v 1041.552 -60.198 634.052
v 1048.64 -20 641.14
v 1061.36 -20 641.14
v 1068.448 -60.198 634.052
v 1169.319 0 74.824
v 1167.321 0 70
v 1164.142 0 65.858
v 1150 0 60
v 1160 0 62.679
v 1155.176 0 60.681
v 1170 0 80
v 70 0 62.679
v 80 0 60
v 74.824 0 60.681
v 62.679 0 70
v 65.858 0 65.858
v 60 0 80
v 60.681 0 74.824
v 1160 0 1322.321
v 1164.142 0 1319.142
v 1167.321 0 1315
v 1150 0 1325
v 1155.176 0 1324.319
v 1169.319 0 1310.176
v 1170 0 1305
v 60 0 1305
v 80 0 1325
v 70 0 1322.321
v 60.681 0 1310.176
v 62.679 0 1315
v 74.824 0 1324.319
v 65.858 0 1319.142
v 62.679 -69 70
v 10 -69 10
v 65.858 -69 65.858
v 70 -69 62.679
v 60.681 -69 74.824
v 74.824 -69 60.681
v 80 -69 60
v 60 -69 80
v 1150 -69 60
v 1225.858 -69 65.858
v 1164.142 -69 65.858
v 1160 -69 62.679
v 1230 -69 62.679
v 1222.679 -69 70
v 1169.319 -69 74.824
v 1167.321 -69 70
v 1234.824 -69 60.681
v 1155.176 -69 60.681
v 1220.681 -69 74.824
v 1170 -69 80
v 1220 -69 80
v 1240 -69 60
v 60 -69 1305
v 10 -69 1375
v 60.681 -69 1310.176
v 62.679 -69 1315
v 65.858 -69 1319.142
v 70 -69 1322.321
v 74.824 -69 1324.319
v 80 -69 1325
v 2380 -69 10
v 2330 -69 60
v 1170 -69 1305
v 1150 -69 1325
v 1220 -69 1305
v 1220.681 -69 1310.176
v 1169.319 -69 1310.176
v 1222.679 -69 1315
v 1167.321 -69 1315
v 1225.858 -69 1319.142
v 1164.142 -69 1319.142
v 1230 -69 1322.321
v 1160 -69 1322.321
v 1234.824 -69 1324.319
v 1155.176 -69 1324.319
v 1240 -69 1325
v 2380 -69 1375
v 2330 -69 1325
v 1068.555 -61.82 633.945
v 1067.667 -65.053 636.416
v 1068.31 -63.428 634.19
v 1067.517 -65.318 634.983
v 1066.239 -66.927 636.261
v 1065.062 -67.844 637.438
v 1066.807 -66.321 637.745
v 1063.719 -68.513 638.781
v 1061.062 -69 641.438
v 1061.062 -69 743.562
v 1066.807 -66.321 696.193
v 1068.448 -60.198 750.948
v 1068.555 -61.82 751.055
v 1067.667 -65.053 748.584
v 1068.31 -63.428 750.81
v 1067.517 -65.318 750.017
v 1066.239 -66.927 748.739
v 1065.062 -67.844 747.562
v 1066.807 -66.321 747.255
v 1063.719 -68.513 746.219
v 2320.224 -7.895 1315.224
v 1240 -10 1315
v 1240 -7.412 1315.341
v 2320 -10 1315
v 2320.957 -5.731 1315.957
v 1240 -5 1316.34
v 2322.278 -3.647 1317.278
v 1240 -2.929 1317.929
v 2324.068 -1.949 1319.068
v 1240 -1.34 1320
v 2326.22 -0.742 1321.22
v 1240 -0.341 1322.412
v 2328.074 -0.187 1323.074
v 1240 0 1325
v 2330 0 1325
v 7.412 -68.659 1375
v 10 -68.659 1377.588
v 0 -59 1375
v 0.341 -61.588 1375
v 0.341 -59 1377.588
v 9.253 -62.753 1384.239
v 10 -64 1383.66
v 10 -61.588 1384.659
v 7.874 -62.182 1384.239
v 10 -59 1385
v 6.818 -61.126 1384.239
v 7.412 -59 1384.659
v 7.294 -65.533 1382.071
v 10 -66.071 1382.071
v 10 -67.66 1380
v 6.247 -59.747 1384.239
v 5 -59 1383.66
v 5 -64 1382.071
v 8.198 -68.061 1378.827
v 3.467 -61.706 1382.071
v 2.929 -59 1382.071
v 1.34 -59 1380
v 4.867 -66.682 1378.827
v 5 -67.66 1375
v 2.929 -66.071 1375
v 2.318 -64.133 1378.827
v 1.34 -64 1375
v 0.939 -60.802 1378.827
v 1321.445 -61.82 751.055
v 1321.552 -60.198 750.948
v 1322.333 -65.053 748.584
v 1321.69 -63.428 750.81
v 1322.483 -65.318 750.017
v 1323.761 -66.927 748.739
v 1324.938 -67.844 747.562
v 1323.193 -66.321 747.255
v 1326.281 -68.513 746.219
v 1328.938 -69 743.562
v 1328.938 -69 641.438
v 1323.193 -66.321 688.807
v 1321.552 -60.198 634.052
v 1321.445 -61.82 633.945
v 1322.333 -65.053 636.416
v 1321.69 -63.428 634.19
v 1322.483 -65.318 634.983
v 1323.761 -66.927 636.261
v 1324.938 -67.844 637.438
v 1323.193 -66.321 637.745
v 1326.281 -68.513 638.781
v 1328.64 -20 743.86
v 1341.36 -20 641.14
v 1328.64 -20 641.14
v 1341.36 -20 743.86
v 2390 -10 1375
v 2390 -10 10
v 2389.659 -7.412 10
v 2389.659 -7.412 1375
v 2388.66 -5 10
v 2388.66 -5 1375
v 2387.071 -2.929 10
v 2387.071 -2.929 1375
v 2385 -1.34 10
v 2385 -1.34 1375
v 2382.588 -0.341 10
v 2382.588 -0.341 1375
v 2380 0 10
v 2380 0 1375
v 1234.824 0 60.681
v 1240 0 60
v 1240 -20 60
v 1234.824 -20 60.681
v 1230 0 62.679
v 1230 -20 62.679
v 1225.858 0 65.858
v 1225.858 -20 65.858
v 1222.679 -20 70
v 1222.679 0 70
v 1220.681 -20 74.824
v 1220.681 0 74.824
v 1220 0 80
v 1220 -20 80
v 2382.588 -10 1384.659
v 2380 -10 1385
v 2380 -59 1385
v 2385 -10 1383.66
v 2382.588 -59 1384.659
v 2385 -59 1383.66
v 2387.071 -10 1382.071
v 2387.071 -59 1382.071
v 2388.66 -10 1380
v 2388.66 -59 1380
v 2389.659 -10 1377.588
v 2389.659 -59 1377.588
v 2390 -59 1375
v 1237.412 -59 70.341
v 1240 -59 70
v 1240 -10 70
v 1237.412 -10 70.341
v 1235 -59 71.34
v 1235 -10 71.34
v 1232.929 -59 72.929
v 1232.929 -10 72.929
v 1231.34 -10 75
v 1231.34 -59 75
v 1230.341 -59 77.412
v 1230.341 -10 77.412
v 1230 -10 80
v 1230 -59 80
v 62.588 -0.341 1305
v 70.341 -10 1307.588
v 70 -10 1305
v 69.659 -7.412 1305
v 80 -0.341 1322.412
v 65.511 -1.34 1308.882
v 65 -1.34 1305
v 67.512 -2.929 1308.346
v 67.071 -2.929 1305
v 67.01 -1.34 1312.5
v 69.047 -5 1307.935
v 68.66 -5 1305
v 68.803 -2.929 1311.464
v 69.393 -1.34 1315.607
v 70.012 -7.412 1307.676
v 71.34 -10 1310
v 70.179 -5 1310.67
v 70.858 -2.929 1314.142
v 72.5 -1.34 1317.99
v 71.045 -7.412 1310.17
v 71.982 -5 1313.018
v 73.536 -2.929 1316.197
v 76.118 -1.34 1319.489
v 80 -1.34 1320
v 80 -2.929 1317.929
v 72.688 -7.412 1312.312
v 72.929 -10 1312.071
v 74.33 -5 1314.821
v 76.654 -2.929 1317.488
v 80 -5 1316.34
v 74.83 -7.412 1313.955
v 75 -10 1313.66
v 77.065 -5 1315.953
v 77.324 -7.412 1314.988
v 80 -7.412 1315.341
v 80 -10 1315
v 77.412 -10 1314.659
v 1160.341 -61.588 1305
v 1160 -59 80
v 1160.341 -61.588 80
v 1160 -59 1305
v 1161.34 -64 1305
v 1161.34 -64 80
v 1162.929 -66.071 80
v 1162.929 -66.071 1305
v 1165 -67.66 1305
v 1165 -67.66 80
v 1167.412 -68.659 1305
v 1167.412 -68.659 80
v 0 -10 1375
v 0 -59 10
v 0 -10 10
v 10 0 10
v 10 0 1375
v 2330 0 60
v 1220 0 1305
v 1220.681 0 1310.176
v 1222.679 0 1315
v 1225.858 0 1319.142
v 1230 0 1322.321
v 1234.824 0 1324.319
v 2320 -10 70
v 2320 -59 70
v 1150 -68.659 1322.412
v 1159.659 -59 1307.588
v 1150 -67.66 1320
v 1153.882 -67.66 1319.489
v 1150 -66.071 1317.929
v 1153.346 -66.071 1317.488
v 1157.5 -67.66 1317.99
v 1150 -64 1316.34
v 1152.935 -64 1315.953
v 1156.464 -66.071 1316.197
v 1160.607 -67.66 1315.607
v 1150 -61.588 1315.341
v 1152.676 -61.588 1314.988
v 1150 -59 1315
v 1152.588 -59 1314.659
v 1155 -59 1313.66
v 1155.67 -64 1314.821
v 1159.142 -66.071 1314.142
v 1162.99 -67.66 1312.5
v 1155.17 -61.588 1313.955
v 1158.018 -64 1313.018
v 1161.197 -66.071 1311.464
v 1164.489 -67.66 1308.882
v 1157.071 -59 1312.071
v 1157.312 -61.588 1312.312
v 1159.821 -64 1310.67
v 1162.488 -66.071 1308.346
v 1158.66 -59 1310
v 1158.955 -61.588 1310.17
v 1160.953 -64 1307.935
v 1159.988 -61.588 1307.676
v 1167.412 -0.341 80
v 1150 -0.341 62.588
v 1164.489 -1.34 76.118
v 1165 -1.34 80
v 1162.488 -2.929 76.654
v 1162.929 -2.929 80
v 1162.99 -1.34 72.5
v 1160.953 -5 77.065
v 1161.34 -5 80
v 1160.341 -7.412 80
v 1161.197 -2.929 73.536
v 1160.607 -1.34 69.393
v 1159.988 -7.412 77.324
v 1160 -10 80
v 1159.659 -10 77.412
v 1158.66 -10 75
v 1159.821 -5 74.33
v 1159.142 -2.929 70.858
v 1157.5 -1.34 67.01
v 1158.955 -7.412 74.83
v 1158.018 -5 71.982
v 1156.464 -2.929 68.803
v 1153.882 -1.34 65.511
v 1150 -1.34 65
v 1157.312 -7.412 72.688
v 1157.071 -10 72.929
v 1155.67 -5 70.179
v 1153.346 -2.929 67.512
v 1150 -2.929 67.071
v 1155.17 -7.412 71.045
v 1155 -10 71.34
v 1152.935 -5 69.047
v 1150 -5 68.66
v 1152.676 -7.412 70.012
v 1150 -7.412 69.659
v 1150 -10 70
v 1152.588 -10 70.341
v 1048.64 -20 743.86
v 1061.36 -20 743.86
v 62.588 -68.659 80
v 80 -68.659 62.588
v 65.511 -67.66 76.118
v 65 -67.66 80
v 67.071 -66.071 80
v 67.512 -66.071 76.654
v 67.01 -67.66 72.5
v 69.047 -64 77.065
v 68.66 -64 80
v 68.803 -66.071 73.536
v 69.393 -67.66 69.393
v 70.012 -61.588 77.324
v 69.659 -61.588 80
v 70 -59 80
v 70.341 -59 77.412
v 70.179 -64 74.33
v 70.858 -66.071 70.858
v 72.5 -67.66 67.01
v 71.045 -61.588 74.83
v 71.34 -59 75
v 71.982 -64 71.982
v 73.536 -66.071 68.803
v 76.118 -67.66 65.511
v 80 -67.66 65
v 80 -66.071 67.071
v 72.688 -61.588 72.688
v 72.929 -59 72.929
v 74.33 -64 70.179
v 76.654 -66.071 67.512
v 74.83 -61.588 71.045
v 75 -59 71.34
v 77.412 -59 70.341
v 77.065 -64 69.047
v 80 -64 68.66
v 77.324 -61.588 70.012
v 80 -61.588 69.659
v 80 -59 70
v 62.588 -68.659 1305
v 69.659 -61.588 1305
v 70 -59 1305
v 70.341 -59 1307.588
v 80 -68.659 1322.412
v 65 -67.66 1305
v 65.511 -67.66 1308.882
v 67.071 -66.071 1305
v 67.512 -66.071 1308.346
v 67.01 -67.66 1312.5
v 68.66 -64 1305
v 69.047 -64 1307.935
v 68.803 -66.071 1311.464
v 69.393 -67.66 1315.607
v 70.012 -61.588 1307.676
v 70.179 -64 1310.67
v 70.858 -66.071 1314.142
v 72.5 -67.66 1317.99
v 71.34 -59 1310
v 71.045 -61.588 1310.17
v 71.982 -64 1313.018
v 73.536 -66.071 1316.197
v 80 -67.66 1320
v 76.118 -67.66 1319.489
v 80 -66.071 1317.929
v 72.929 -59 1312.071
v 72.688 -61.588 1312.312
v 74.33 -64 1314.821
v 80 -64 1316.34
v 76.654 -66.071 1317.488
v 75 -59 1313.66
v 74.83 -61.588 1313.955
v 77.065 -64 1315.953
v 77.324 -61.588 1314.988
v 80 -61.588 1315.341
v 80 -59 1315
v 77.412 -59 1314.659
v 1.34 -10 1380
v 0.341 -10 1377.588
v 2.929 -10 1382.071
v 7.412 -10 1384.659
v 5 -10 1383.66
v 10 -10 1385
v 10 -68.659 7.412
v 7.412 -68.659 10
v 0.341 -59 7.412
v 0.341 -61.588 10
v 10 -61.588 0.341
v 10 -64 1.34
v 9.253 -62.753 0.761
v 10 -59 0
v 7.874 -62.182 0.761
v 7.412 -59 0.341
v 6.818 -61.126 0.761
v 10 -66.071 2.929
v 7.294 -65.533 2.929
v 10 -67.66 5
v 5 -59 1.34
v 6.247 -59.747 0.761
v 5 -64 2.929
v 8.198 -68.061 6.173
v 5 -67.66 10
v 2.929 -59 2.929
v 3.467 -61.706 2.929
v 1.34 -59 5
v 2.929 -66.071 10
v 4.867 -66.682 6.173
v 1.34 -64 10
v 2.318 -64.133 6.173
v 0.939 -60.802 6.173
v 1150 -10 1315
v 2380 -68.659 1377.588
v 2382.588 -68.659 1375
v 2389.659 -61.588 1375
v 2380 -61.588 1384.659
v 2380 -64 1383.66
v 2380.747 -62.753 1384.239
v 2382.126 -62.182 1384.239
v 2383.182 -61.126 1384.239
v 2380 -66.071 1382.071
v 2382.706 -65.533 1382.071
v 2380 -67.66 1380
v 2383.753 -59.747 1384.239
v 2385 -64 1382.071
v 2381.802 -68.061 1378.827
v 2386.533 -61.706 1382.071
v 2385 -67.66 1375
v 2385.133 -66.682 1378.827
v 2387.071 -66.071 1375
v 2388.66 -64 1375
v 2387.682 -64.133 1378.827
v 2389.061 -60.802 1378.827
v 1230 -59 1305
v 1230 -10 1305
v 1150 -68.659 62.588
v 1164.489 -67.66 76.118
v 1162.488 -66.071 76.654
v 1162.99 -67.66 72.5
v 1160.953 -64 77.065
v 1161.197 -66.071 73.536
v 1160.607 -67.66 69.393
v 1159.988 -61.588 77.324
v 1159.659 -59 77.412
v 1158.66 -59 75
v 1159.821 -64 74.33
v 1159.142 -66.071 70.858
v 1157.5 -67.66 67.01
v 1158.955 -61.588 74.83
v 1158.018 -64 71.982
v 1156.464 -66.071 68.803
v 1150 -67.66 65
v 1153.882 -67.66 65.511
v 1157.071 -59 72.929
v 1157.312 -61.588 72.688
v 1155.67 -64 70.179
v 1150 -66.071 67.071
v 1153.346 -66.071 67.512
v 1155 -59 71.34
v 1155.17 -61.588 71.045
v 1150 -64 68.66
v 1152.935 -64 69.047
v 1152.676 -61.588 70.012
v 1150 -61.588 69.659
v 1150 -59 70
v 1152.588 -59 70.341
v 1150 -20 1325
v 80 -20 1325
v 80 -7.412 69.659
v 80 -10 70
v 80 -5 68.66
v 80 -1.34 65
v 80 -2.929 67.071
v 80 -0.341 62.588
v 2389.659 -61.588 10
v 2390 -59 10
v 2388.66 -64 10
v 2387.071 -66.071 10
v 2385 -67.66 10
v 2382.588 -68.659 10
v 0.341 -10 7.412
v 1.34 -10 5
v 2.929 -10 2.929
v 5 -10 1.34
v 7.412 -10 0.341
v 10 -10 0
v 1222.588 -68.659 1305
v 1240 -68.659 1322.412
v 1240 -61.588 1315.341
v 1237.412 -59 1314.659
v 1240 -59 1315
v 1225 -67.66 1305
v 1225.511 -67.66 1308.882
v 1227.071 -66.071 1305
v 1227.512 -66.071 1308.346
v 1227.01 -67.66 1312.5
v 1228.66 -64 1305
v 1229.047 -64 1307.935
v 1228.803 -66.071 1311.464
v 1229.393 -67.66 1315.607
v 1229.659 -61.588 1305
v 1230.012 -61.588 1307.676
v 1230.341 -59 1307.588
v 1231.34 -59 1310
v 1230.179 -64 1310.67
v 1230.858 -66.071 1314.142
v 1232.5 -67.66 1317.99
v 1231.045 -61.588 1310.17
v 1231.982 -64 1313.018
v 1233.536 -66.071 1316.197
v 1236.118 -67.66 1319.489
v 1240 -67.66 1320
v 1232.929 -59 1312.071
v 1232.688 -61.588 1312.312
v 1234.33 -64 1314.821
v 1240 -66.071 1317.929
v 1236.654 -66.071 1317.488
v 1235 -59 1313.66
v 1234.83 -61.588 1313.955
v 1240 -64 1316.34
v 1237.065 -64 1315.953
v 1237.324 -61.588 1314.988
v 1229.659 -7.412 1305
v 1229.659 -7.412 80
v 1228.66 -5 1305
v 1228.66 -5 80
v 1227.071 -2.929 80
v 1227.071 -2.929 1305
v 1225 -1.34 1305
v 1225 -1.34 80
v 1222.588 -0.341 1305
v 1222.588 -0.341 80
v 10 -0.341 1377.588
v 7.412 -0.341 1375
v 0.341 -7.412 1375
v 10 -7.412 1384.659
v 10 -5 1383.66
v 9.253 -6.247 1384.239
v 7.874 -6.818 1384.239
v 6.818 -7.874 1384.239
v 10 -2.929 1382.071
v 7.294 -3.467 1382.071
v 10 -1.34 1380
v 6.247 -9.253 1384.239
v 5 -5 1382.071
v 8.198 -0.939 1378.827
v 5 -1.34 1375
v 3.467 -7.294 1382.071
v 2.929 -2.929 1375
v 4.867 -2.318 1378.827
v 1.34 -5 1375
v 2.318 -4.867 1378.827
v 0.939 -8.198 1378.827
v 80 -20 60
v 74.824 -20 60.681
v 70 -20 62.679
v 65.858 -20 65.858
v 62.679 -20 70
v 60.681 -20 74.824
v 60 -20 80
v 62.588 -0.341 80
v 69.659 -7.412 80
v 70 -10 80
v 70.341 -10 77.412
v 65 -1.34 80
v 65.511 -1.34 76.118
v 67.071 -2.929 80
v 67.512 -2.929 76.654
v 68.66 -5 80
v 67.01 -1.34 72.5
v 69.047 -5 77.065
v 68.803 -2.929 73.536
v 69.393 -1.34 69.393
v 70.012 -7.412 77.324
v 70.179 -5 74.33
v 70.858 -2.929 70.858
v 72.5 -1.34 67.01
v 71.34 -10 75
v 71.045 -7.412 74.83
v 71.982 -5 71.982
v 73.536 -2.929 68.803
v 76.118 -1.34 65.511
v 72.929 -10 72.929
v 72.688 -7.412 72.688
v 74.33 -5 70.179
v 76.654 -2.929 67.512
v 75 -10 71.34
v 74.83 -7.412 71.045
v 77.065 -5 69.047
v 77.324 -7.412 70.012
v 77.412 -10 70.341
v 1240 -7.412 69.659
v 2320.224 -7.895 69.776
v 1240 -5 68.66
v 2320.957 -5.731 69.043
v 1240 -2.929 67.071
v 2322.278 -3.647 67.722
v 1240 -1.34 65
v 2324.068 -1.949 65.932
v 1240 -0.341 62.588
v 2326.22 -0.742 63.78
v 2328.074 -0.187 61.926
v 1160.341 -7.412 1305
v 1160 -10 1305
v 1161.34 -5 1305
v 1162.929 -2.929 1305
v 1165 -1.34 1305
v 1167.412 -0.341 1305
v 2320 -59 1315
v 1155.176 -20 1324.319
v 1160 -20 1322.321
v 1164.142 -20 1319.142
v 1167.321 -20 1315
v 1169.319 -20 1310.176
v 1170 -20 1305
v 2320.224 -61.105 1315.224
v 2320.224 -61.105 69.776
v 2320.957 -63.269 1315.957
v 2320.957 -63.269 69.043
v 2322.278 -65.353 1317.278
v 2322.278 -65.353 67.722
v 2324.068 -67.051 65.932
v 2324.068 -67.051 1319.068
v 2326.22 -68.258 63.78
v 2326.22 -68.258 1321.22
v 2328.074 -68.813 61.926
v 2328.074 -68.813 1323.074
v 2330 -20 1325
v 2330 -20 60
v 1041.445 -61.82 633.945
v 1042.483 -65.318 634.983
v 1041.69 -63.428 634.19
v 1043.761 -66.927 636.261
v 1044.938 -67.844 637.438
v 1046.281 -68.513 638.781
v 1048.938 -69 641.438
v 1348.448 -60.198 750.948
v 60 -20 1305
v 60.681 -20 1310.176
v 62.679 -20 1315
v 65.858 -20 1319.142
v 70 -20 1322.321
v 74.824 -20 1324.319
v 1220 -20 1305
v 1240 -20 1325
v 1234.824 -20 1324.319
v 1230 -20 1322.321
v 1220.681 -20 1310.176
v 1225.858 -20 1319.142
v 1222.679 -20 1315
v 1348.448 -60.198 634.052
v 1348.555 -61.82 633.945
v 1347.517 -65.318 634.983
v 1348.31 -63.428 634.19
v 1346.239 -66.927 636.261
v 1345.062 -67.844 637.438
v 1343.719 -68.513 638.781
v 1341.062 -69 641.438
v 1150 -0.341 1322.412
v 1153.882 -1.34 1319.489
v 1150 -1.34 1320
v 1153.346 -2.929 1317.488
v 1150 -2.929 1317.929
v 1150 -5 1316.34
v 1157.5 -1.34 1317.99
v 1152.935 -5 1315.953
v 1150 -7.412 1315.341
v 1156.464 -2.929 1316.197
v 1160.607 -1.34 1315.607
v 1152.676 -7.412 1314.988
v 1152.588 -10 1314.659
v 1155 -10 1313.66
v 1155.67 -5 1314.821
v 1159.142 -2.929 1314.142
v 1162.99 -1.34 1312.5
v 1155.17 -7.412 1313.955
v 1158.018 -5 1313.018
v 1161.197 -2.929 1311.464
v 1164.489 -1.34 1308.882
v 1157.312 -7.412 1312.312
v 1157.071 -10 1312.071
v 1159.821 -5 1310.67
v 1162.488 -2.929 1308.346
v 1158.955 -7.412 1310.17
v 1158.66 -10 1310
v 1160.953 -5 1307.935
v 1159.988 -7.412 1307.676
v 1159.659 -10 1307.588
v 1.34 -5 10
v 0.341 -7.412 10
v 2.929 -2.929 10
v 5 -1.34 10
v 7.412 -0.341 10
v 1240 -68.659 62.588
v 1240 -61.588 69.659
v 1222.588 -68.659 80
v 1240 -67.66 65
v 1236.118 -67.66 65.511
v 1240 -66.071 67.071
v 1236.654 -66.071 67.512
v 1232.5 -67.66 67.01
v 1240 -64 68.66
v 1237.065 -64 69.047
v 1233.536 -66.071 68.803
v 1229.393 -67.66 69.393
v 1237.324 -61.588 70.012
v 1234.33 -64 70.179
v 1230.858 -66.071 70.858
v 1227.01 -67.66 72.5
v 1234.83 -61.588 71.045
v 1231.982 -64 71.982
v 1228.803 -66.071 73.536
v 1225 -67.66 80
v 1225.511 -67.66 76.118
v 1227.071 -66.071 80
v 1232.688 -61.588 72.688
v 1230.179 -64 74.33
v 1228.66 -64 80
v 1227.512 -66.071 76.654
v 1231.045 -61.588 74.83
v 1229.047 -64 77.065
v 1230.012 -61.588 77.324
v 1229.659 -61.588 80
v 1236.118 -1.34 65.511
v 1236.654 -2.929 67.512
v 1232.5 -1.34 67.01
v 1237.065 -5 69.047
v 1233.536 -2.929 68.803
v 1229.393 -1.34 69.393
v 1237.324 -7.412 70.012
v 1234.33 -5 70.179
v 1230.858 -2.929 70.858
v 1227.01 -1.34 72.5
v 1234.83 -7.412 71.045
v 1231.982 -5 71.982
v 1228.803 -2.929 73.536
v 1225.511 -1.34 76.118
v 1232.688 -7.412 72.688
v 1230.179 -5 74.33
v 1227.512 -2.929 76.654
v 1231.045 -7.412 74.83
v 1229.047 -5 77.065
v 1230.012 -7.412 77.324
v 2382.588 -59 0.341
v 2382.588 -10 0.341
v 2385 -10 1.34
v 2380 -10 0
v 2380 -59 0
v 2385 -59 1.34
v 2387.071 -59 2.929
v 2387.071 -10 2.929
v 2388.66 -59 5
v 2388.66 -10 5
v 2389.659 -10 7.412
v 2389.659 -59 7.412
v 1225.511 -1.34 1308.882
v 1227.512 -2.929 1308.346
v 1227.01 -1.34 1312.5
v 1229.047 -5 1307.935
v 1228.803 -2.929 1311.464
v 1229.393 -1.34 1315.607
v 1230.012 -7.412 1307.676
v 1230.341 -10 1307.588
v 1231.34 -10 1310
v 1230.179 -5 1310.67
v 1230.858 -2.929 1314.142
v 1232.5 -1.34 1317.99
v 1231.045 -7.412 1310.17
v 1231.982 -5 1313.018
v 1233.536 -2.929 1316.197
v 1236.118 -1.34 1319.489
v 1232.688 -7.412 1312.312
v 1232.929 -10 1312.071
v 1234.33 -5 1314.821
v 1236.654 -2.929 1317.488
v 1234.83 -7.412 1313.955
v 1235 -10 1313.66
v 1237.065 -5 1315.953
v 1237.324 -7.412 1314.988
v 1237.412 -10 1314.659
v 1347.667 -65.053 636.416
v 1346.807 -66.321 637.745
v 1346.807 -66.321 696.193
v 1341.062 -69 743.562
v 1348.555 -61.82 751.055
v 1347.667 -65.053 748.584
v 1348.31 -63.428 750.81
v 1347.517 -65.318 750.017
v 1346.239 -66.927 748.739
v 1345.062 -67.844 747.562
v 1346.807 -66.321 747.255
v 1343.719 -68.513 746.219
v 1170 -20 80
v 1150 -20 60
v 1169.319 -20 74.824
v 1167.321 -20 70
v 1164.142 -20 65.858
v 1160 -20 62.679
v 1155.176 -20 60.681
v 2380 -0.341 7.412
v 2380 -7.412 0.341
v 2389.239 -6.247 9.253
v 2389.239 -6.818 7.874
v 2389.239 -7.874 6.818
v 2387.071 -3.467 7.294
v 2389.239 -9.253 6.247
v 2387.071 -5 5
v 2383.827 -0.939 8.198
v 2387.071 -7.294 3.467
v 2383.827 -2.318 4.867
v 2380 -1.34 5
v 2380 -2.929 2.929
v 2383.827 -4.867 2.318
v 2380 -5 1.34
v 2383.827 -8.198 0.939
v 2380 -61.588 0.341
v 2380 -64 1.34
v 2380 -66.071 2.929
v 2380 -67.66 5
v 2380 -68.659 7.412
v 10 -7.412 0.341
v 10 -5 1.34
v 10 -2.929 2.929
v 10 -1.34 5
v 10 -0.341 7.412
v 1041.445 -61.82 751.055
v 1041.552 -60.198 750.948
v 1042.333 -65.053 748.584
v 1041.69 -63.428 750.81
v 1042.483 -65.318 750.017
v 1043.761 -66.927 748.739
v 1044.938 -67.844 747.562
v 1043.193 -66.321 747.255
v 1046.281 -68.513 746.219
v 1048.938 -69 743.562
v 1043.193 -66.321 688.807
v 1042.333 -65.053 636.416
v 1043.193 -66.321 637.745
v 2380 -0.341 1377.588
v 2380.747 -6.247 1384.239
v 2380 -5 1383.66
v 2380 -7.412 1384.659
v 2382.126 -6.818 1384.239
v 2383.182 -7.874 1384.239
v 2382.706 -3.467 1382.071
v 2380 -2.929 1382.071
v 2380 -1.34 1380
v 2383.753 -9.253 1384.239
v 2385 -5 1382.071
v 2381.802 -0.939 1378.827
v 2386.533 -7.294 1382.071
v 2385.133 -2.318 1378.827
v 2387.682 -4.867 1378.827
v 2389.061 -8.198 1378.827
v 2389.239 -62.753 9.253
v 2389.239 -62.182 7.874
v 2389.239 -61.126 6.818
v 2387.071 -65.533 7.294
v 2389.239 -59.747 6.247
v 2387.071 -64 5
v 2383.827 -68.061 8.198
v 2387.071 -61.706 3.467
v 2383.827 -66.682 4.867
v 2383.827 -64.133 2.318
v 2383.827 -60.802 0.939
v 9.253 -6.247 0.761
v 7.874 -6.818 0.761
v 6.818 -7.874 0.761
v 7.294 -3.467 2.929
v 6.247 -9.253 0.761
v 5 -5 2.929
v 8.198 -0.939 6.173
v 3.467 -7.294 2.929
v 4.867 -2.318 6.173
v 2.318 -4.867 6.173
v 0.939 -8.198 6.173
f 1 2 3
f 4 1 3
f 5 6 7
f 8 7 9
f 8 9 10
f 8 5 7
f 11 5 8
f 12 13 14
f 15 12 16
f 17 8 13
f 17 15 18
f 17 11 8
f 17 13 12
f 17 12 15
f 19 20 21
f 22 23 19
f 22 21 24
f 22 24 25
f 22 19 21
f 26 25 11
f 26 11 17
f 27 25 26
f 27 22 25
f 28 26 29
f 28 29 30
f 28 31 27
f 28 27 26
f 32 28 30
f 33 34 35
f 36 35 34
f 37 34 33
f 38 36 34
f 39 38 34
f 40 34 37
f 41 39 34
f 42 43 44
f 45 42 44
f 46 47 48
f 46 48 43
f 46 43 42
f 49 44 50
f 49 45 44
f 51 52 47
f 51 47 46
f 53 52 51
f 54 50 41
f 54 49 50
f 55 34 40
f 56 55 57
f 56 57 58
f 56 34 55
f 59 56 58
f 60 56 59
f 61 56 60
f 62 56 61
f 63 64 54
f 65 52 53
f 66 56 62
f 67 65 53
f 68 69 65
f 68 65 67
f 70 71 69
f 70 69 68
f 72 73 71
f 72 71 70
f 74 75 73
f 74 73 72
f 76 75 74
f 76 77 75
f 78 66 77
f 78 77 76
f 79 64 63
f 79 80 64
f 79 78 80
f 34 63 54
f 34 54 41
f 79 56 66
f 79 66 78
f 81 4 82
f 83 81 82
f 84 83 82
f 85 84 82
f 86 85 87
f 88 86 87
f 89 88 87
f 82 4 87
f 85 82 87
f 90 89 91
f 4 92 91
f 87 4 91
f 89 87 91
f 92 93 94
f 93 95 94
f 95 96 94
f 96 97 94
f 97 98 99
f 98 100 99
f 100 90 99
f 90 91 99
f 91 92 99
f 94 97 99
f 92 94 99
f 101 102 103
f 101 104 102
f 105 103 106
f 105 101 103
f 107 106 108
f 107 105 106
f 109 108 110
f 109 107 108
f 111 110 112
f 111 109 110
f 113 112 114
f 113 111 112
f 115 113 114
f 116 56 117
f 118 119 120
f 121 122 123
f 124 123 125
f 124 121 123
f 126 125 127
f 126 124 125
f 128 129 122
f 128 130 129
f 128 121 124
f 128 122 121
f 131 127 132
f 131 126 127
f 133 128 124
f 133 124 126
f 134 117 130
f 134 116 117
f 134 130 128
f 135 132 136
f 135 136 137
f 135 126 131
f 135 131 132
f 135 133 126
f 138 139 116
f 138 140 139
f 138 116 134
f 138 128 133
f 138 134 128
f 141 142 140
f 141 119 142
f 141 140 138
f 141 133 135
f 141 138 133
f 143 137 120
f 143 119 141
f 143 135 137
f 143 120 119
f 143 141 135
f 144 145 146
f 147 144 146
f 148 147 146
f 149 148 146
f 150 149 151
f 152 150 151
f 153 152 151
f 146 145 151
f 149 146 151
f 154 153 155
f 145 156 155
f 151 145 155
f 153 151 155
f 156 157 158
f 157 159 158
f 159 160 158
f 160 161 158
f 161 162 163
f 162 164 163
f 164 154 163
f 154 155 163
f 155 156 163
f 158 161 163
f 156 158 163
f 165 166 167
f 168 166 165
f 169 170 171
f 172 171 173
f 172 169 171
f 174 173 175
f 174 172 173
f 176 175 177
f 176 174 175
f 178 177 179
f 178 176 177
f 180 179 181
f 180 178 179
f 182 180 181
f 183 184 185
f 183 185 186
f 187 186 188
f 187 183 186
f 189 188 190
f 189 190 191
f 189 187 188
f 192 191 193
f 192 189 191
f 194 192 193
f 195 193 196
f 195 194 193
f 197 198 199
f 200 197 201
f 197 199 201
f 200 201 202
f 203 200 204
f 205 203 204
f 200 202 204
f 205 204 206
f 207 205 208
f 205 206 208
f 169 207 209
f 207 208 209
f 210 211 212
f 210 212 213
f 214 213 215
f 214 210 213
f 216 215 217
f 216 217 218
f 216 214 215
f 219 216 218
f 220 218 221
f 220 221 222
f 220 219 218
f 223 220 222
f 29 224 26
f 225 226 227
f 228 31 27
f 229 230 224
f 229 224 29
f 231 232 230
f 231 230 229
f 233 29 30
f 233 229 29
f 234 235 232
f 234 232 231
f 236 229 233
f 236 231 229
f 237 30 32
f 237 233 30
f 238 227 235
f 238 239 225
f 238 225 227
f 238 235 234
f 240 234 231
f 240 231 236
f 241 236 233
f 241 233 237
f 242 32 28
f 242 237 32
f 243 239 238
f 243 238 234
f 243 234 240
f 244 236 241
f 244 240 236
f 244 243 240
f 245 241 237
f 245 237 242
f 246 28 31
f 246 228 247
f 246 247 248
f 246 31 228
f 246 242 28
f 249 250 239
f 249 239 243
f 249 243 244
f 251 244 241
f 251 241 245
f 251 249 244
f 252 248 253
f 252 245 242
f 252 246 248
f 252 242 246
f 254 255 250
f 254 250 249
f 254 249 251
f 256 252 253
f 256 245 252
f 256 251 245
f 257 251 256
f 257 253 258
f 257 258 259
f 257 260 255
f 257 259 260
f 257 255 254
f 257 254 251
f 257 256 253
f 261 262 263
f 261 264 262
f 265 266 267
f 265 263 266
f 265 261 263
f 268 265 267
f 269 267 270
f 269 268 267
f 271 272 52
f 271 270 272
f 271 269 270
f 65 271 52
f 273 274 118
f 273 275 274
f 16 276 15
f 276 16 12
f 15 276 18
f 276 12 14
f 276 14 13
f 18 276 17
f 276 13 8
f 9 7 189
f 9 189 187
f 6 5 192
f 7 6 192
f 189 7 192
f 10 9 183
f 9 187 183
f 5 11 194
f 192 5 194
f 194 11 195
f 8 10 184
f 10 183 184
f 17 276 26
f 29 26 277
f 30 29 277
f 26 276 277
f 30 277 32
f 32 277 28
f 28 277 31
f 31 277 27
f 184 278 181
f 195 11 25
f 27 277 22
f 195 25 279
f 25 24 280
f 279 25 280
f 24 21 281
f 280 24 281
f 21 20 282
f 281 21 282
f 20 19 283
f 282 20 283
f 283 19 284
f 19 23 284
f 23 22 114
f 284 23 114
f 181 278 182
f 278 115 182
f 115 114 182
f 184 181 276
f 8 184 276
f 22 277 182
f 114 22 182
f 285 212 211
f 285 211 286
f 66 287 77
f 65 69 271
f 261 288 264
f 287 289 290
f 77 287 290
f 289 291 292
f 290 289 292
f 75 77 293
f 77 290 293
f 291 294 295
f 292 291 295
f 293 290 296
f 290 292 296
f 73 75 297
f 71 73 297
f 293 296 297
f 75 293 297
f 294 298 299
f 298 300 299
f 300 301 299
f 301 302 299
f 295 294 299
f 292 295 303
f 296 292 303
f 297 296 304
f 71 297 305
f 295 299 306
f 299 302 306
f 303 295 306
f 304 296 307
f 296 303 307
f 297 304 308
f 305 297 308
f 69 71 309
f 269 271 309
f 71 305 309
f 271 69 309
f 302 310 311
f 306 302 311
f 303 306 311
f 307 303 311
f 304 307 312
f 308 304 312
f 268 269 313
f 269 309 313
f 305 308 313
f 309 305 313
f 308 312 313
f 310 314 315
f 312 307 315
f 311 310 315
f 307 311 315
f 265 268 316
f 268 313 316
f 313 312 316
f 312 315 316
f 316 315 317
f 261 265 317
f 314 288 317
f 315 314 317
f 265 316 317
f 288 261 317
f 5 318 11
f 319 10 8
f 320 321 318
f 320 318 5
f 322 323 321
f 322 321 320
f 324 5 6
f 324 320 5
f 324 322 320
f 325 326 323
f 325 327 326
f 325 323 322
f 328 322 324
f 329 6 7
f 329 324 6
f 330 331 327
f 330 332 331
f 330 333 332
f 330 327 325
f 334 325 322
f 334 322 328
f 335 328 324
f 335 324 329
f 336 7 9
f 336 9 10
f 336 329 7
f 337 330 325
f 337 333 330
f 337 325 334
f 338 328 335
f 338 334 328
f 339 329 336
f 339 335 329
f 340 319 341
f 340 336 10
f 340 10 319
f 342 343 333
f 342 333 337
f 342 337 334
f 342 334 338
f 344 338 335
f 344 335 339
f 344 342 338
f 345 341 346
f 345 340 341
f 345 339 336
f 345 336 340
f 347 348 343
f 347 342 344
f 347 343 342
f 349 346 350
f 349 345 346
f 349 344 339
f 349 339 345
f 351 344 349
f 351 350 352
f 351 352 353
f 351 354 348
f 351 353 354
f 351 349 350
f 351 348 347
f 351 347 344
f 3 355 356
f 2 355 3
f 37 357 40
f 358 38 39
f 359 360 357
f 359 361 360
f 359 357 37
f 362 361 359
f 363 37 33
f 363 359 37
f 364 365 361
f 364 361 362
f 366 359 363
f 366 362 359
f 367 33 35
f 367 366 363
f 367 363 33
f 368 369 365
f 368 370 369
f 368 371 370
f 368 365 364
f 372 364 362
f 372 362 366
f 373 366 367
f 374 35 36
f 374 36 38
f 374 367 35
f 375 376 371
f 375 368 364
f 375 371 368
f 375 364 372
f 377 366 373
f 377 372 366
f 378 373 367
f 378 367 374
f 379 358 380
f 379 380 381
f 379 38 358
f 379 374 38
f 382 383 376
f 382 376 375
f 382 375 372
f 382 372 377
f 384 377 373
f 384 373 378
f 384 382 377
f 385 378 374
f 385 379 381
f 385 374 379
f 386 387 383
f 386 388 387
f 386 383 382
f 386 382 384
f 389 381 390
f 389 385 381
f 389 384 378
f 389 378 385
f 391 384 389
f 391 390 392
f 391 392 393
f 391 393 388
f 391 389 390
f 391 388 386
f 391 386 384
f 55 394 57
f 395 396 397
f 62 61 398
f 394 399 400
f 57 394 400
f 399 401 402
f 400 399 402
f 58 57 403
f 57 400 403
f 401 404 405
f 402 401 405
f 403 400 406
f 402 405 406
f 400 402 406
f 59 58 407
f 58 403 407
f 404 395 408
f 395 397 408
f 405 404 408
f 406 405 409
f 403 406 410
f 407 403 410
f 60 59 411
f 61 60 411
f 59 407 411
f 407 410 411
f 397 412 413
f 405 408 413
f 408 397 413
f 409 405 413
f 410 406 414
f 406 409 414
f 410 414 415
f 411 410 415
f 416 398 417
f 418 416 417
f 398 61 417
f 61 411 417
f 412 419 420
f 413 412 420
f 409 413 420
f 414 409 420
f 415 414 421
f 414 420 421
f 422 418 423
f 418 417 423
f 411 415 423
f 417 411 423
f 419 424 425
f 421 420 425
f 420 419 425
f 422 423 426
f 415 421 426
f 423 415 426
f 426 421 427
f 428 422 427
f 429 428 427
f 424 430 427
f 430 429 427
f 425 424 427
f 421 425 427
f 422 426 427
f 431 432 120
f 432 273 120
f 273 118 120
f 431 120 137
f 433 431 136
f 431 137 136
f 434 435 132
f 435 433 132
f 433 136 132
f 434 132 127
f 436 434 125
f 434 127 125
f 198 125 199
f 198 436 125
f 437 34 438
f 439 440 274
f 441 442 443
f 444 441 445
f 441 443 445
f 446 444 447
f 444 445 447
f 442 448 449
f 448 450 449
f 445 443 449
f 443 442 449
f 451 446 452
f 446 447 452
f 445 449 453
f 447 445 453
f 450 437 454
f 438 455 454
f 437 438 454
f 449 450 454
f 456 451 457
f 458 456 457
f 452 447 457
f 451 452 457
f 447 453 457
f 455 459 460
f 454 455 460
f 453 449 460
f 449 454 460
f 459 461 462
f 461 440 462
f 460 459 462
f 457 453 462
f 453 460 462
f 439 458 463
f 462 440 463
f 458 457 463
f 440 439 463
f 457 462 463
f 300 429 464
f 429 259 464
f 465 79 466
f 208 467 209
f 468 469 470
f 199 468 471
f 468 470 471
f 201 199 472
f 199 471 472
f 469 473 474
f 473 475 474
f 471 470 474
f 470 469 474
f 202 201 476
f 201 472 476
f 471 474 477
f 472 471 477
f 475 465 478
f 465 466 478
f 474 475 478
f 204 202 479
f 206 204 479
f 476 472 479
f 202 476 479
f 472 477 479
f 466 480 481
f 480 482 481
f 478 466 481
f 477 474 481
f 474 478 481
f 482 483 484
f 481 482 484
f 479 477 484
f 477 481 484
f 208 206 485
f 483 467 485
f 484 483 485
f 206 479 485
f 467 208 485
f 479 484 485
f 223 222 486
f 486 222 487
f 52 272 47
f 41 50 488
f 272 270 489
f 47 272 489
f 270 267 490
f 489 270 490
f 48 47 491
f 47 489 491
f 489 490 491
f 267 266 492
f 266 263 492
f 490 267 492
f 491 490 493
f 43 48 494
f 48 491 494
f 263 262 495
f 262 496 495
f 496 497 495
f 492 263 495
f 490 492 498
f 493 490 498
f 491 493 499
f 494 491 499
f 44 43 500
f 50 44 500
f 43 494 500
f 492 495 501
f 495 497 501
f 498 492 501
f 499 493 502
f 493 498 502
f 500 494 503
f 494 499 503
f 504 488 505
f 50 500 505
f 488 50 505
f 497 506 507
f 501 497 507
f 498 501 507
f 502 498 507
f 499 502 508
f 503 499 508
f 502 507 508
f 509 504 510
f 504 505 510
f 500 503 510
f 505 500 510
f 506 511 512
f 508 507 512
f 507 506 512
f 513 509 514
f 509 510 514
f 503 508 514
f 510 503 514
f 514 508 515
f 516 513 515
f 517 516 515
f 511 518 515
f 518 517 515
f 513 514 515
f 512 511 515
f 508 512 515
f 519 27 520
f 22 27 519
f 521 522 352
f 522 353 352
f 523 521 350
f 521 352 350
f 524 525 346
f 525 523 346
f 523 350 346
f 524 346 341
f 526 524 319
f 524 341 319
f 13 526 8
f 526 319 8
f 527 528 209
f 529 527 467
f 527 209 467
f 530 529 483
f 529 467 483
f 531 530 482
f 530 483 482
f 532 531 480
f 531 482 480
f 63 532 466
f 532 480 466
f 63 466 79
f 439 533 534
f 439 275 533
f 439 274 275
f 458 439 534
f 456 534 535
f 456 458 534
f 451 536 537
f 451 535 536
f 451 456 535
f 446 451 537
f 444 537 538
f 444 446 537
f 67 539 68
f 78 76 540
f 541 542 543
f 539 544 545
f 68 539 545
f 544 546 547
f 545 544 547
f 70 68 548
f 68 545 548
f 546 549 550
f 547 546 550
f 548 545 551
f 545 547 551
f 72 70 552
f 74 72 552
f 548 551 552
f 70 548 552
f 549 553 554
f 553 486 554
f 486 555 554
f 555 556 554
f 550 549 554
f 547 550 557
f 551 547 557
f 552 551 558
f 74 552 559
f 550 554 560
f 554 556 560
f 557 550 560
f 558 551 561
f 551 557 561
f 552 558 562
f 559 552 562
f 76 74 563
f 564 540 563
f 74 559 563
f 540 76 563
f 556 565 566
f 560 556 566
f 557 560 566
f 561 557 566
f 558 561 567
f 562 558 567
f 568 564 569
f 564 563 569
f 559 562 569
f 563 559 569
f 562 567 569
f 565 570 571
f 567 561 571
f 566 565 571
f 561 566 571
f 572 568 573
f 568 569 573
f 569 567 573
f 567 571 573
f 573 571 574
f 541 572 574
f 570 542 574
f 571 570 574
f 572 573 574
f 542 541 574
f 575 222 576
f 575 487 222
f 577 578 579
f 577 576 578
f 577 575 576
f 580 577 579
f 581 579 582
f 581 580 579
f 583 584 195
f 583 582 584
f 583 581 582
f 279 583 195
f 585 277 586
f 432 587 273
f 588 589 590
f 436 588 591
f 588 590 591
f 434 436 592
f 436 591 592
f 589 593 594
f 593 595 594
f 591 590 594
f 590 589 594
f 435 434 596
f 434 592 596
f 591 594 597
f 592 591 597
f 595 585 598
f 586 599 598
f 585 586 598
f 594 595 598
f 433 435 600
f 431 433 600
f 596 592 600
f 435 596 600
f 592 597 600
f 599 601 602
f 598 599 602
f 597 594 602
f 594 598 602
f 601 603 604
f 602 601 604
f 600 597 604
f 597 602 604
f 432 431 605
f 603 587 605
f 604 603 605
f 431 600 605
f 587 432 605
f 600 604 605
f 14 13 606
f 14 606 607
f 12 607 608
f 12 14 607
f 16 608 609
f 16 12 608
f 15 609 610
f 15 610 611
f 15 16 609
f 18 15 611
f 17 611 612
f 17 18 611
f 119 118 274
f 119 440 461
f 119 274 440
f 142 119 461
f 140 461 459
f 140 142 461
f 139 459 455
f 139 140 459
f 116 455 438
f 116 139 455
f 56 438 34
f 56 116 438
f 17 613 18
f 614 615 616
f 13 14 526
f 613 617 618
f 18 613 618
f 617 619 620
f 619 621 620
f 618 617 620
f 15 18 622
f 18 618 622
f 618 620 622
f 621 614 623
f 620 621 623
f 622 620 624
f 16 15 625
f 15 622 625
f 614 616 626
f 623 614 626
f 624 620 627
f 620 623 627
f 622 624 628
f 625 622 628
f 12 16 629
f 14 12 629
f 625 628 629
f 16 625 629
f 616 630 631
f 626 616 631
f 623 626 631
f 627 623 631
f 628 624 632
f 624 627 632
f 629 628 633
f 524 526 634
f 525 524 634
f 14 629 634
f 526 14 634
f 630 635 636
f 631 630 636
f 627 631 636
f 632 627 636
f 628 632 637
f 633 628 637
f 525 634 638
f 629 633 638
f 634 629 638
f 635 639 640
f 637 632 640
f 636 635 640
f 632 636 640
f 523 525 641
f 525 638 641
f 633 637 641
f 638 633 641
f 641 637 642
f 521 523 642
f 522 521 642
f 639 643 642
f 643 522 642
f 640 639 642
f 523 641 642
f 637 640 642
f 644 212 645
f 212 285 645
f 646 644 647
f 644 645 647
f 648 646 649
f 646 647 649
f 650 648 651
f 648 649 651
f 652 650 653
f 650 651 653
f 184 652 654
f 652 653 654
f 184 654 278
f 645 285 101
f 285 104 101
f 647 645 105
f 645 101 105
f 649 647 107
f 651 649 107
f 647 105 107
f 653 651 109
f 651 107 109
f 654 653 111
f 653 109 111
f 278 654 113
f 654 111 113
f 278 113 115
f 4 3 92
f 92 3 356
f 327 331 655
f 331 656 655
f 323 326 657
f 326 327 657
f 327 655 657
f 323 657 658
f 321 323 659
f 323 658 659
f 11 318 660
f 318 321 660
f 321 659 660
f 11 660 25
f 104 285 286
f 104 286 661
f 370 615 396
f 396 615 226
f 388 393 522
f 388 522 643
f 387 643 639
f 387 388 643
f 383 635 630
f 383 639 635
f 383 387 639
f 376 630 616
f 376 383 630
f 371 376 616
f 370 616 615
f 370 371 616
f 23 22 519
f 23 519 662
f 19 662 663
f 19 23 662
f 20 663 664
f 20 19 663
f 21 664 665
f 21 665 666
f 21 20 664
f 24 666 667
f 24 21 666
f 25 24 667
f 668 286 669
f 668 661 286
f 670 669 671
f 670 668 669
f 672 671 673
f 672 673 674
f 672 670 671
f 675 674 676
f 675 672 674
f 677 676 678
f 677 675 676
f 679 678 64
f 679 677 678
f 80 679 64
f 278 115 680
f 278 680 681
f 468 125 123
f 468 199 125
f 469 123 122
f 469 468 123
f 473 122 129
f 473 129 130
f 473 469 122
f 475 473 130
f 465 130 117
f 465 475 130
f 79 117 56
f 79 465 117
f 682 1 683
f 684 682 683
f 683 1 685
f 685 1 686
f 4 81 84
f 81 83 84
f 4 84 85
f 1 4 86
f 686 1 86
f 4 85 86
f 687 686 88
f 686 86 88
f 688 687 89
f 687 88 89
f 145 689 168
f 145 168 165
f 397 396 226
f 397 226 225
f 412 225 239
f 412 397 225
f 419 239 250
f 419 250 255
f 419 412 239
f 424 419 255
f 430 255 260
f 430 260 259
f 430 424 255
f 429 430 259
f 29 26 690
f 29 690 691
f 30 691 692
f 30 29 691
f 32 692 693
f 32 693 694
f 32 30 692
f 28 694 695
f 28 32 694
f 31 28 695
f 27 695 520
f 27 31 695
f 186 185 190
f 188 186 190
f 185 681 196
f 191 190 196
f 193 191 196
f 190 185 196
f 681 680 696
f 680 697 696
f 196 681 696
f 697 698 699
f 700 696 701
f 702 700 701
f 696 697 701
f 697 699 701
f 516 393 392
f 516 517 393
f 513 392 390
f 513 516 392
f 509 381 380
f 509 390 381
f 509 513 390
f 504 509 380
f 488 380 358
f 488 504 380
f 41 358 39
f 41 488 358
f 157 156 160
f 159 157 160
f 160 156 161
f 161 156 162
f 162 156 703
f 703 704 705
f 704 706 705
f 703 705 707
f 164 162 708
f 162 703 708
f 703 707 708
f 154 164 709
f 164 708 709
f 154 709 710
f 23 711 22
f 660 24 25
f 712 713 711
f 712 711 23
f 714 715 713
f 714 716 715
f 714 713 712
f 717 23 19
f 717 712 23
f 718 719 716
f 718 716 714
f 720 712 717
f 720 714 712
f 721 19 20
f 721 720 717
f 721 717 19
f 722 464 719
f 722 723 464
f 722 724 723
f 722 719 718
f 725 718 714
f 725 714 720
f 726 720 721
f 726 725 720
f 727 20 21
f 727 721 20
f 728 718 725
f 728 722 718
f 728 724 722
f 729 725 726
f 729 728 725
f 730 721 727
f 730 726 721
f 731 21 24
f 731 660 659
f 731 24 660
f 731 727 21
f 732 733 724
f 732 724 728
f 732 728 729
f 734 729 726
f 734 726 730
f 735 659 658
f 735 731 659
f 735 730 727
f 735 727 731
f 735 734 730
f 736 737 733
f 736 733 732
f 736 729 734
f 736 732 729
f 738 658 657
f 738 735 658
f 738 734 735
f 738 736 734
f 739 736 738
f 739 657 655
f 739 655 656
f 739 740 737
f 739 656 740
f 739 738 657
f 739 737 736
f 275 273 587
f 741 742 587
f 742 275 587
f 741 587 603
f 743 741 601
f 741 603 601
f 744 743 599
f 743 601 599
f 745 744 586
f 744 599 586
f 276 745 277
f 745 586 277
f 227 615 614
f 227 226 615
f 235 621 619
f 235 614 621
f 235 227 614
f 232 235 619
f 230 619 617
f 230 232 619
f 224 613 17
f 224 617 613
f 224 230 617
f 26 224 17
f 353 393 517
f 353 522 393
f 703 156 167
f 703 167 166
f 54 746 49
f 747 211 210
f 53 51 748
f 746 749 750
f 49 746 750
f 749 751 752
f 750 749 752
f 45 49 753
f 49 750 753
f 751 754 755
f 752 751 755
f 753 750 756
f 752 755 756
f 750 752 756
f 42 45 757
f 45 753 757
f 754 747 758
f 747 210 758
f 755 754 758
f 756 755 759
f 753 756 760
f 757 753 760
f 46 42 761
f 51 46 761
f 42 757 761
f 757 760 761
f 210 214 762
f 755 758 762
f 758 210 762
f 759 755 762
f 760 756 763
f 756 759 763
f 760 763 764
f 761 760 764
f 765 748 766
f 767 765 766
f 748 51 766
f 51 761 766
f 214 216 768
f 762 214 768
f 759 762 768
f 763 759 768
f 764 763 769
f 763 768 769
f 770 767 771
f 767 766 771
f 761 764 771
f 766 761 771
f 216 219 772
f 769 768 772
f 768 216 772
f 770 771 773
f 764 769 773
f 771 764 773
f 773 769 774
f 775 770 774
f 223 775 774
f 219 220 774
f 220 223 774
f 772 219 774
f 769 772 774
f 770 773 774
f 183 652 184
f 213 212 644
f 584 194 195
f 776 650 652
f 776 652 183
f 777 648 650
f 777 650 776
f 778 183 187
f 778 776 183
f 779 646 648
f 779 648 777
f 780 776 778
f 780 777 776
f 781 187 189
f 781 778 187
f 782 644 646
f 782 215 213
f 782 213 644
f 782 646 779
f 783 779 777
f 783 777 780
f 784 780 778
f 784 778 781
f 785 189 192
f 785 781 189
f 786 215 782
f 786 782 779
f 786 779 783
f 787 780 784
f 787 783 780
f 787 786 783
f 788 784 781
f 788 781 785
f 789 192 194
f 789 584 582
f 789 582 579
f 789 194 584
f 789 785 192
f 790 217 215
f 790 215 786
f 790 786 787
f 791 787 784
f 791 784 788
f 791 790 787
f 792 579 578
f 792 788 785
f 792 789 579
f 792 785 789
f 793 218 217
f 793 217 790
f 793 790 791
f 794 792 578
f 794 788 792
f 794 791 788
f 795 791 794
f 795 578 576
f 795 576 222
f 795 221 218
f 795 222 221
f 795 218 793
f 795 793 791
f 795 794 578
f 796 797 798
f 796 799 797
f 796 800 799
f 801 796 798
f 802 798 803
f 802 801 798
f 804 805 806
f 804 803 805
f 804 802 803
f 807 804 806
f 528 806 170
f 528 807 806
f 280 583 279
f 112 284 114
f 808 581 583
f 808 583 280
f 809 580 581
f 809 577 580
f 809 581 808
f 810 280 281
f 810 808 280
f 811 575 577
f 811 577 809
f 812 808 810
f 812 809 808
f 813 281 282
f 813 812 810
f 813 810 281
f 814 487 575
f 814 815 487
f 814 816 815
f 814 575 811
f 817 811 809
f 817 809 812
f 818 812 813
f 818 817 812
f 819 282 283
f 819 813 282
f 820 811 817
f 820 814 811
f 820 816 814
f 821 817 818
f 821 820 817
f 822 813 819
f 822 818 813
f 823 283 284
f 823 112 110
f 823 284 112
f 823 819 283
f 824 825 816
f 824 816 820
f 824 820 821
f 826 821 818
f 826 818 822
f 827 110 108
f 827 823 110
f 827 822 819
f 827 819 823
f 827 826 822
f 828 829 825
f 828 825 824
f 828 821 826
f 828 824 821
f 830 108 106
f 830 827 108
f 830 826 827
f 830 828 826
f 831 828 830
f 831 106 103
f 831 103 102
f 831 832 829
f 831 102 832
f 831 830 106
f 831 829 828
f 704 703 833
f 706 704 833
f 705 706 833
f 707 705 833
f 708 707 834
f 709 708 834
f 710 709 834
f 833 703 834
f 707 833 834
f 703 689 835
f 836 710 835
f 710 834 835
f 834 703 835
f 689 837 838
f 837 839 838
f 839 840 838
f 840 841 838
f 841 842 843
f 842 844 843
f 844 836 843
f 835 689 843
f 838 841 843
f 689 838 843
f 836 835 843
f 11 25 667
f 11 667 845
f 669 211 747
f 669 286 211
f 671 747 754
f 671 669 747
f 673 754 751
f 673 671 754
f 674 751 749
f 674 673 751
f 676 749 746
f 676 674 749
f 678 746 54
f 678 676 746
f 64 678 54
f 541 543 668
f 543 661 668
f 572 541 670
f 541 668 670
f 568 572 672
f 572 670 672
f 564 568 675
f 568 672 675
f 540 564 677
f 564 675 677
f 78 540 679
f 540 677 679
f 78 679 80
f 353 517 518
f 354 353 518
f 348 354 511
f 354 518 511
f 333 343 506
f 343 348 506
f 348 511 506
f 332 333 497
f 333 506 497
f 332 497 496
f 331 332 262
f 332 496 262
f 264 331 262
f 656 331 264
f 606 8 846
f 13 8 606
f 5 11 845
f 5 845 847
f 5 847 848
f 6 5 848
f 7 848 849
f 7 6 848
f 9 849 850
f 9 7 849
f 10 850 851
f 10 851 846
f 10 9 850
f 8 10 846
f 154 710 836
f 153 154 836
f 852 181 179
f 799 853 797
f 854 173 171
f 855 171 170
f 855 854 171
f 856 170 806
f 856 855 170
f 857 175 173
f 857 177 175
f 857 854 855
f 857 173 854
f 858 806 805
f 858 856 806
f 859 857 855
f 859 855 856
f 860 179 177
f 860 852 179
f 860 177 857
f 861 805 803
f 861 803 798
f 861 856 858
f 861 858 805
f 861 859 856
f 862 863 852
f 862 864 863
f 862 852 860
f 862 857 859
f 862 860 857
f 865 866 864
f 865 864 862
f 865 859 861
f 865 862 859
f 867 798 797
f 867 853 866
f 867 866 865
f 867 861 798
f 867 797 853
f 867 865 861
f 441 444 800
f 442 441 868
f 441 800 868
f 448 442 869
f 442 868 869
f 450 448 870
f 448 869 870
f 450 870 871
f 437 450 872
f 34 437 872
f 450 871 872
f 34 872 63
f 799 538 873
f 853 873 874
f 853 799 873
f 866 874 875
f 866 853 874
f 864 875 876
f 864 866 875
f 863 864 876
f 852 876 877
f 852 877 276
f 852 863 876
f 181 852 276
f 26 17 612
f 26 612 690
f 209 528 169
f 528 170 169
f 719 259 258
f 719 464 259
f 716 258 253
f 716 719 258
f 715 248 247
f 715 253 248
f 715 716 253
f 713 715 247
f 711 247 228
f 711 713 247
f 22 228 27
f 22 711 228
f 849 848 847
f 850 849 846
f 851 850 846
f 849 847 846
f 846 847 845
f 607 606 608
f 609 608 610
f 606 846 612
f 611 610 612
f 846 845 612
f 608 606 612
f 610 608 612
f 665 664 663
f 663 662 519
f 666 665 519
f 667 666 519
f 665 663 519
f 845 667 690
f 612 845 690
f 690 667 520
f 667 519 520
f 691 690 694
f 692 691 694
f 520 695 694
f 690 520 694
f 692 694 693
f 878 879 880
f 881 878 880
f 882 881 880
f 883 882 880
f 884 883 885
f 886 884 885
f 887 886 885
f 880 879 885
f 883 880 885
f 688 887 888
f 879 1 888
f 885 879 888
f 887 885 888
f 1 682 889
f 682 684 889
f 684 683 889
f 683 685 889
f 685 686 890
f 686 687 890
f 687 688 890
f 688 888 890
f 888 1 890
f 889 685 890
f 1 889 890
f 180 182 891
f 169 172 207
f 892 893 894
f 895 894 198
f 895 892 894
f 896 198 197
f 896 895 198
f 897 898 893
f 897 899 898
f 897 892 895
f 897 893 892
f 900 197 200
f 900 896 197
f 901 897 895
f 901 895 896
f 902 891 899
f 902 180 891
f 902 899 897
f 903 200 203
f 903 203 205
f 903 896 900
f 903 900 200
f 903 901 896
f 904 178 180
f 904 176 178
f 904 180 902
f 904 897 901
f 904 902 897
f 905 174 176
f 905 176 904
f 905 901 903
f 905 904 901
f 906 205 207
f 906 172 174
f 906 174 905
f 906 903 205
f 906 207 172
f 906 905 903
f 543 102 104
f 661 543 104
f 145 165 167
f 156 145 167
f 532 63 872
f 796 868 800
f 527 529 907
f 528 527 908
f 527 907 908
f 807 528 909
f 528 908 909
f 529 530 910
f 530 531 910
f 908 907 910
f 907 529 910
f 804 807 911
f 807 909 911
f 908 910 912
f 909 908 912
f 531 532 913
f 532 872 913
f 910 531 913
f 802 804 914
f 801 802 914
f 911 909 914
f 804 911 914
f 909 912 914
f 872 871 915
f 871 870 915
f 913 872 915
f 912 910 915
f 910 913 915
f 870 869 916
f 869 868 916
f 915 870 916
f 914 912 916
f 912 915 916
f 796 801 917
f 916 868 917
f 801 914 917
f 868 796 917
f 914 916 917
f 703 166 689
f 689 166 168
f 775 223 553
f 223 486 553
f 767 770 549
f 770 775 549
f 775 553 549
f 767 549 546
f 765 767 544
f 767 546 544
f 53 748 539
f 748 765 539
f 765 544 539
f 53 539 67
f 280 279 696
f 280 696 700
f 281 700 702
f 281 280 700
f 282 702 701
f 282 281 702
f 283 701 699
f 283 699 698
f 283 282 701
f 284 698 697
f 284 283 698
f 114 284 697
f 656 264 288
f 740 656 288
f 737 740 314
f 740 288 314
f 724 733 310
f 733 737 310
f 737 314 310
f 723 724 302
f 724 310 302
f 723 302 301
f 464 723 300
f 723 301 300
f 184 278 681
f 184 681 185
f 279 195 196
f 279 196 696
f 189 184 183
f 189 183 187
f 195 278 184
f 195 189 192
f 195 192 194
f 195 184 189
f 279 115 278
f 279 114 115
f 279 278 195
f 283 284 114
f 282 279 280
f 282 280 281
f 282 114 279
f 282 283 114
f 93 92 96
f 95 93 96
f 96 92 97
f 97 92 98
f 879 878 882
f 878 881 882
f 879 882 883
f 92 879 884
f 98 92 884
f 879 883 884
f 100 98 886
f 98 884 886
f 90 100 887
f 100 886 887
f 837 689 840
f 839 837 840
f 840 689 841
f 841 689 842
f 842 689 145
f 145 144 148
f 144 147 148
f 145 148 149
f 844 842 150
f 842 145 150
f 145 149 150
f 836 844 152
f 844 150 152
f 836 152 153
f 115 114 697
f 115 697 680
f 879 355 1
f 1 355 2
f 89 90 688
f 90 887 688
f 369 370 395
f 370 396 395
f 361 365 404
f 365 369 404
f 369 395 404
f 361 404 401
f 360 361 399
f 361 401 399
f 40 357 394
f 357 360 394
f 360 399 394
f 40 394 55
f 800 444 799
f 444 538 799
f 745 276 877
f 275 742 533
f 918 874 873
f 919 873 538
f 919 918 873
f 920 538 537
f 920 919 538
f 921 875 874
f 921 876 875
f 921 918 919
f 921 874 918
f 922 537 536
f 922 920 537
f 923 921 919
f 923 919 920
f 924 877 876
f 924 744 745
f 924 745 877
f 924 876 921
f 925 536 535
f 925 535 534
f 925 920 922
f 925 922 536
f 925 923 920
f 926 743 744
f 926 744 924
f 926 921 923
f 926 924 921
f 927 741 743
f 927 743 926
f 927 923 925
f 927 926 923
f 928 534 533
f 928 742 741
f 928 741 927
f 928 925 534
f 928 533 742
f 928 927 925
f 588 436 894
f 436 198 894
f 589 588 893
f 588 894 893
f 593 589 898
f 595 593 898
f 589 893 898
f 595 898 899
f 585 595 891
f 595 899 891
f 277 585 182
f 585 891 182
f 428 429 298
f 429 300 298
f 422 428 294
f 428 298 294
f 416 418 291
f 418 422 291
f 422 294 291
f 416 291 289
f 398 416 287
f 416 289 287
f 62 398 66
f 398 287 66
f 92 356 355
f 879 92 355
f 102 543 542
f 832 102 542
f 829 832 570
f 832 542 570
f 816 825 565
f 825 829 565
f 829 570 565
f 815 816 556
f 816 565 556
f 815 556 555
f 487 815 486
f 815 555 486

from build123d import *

# Parameters (mm, degrees)
F0_W     = 2390
F0_H     = 1385
F0_W_2   = 1090
F0_H_2   = 1245
F1_DEPTH = 69
F2_R     = 10
F5_DEPTH = 20
F7_DEPTH = 49
F7_TAPER = 10
F8_R     = 7.5
F8_2_R   = 7.5


with BuildPart() as f1:
    # F0 (on Front) → F1 (new body)
    with BuildSketch(Plane.XZ):
        with Locations((1195, 692.5)):
            Rectangle(F0_W, F0_H)
        with Locations((615, 692.5)):
            Rectangle(F0_W_2, F0_H_2, mode=Mode.SUBTRACT)
        with Locations((1775, 692.5)):
            Rectangle(F0_W_2, F0_H_2, mode=Mode.SUBTRACT)
    extrude(amount=F1_DEPTH)

    # F2
    f2_edges = [f1.edges().sort_by_distance(p)[0] for p in [
        (0, -69, 692.5),
        (1195, -69, 0),
        (2390, -69, 692.5),
        (1195, -69, 1385),
        (70, -69, 692.5),
        (615, -69, 1315),
        (1160, -69, 692.5),
        (615, -69, 70),
        (2320, -69, 692.5),
        (1775, -69, 70),
        (1230, -69, 692.5),
        (1775, -69, 1315),
        (0, 0, 692.5),
        (1195, 0, 0),
        (2390, 0, 692.5),
        (1195, 0, 1385),
        (70, 0, 692.5),
        (615, 0, 1315),
        (1160, 0, 692.5),
        (615, 0, 70),
        (2320, 0, 692.5),
        (1775, 0, 70),
        (1230, 0, 692.5),
        (1775, 0, 1315),
        (2390, -34.5, 1385),
        (0, -34.5, 1385),
        (2390, -34.5, 0),
        (1160, -34.5, 70),
        (70, -34.5, 70),
        (1230, -34.5, 70),
        (1230, -34.5, 1315),
        (0, -34.5, 0),
        (1160, -34.5, 1315),
        (70, -34.5, 1315),
    ]]
    fillet(f2_edges, radius=F2_R)


with BuildPart() as f5:
    # F4 (on face) → F5 (new body)
    with BuildSketch(Plane(origin=(0, 0, 0), x_dir=(-1, 0, 0), z_dir=(0, 1, 0))):
        with BuildLine():
            Line((-2330, 1325), (-2330, 60))
            Line((-2330, 60), (-1240, 60))
            ThreePointArc((-1240, 60), (-1225.8578643763, 65.8578643763), (-1220, 80))
            Line((-1220, 80), (-1220, 1305))
            ThreePointArc((-1220, 1305), (-1225.8578643763, 1319.1421356237), (-1240, 1325))
            Line((-1240, 1325), (-2330, 1325))
        make_face()
    extrude(amount=-F5_DEPTH)


with BuildPart() as f5b:
    # F4 (on face) → F5, piece 2 (new body)
    with BuildSketch(Plane(origin=(0, 0, 0), x_dir=(-1, 0, 0), z_dir=(0, 1, 0))):
        with BuildLine():
            Line((-80, 1325), (-1150, 1325))
            ThreePointArc((-1150, 1325), (-1164.1421356237, 1319.1421356237), (-1170, 1305))
            Line((-1170, 1305), (-1170, 80))
            ThreePointArc((-1170, 80), (-1164.1421356237, 65.8578643763), (-1150, 60))
            Line((-1150, 60), (-80, 60))
            ThreePointArc((-80, 60), (-65.8578643763, 65.8578643763), (-60, 80))
            Line((-60, 80), (-60, 1305))
            ThreePointArc((-60, 1305), (-65.8578643763, 1319.1421356237), (-80, 1325))
        make_face()
    extrude(amount=-F5_DEPTH)


with BuildPart() as f7:
    # F6 (on face) → F7 (new body, through all)
    with BuildSketch(Plane.XZ.offset(69)):
        Polygon((1070, 692.5), (1070, 752.5), (1040, 752.5), (1040, 632.5), (1070, 632.5), align=None)
    extrude(amount=-F7_DEPTH, taper=F7_TAPER)

    # F8#2
    f8_2_edges = [f7.edges().sort_by_distance(p)[0] for p in [
        (1070, -69, 692.5),
        (1055, -69, 752.5),
        (1040, -69, 692.5),
        (1055, -69, 632.5),
    ]]
    fillet(f8_2_edges, radius=F8_2_R)


with BuildPart() as f7b:
    # F6 (on face) → F7, piece 2 (new body, through all)
    with BuildSketch(Plane.XZ.offset(69)):
        Polygon((1320, 632.5), (1350, 632.5), (1350, 752.5), (1320, 752.5), (1320, 692.5), align=None)
    extrude(amount=-F7_DEPTH, taper=F7_TAPER)

    # F8
    f8_edges = [f7b.edges().sort_by_distance(p)[0] for p in [
        (1335, -69, 632.5),
        (1350, -69, 692.5),
        (1335, -69, 752.5),
        (1320, -69, 692.5),
    ]]
    fillet(f8_edges, radius=F8_R)


solid = Compound([f1.part, f5.part, f5b.part, f7.part, f7b.part])
